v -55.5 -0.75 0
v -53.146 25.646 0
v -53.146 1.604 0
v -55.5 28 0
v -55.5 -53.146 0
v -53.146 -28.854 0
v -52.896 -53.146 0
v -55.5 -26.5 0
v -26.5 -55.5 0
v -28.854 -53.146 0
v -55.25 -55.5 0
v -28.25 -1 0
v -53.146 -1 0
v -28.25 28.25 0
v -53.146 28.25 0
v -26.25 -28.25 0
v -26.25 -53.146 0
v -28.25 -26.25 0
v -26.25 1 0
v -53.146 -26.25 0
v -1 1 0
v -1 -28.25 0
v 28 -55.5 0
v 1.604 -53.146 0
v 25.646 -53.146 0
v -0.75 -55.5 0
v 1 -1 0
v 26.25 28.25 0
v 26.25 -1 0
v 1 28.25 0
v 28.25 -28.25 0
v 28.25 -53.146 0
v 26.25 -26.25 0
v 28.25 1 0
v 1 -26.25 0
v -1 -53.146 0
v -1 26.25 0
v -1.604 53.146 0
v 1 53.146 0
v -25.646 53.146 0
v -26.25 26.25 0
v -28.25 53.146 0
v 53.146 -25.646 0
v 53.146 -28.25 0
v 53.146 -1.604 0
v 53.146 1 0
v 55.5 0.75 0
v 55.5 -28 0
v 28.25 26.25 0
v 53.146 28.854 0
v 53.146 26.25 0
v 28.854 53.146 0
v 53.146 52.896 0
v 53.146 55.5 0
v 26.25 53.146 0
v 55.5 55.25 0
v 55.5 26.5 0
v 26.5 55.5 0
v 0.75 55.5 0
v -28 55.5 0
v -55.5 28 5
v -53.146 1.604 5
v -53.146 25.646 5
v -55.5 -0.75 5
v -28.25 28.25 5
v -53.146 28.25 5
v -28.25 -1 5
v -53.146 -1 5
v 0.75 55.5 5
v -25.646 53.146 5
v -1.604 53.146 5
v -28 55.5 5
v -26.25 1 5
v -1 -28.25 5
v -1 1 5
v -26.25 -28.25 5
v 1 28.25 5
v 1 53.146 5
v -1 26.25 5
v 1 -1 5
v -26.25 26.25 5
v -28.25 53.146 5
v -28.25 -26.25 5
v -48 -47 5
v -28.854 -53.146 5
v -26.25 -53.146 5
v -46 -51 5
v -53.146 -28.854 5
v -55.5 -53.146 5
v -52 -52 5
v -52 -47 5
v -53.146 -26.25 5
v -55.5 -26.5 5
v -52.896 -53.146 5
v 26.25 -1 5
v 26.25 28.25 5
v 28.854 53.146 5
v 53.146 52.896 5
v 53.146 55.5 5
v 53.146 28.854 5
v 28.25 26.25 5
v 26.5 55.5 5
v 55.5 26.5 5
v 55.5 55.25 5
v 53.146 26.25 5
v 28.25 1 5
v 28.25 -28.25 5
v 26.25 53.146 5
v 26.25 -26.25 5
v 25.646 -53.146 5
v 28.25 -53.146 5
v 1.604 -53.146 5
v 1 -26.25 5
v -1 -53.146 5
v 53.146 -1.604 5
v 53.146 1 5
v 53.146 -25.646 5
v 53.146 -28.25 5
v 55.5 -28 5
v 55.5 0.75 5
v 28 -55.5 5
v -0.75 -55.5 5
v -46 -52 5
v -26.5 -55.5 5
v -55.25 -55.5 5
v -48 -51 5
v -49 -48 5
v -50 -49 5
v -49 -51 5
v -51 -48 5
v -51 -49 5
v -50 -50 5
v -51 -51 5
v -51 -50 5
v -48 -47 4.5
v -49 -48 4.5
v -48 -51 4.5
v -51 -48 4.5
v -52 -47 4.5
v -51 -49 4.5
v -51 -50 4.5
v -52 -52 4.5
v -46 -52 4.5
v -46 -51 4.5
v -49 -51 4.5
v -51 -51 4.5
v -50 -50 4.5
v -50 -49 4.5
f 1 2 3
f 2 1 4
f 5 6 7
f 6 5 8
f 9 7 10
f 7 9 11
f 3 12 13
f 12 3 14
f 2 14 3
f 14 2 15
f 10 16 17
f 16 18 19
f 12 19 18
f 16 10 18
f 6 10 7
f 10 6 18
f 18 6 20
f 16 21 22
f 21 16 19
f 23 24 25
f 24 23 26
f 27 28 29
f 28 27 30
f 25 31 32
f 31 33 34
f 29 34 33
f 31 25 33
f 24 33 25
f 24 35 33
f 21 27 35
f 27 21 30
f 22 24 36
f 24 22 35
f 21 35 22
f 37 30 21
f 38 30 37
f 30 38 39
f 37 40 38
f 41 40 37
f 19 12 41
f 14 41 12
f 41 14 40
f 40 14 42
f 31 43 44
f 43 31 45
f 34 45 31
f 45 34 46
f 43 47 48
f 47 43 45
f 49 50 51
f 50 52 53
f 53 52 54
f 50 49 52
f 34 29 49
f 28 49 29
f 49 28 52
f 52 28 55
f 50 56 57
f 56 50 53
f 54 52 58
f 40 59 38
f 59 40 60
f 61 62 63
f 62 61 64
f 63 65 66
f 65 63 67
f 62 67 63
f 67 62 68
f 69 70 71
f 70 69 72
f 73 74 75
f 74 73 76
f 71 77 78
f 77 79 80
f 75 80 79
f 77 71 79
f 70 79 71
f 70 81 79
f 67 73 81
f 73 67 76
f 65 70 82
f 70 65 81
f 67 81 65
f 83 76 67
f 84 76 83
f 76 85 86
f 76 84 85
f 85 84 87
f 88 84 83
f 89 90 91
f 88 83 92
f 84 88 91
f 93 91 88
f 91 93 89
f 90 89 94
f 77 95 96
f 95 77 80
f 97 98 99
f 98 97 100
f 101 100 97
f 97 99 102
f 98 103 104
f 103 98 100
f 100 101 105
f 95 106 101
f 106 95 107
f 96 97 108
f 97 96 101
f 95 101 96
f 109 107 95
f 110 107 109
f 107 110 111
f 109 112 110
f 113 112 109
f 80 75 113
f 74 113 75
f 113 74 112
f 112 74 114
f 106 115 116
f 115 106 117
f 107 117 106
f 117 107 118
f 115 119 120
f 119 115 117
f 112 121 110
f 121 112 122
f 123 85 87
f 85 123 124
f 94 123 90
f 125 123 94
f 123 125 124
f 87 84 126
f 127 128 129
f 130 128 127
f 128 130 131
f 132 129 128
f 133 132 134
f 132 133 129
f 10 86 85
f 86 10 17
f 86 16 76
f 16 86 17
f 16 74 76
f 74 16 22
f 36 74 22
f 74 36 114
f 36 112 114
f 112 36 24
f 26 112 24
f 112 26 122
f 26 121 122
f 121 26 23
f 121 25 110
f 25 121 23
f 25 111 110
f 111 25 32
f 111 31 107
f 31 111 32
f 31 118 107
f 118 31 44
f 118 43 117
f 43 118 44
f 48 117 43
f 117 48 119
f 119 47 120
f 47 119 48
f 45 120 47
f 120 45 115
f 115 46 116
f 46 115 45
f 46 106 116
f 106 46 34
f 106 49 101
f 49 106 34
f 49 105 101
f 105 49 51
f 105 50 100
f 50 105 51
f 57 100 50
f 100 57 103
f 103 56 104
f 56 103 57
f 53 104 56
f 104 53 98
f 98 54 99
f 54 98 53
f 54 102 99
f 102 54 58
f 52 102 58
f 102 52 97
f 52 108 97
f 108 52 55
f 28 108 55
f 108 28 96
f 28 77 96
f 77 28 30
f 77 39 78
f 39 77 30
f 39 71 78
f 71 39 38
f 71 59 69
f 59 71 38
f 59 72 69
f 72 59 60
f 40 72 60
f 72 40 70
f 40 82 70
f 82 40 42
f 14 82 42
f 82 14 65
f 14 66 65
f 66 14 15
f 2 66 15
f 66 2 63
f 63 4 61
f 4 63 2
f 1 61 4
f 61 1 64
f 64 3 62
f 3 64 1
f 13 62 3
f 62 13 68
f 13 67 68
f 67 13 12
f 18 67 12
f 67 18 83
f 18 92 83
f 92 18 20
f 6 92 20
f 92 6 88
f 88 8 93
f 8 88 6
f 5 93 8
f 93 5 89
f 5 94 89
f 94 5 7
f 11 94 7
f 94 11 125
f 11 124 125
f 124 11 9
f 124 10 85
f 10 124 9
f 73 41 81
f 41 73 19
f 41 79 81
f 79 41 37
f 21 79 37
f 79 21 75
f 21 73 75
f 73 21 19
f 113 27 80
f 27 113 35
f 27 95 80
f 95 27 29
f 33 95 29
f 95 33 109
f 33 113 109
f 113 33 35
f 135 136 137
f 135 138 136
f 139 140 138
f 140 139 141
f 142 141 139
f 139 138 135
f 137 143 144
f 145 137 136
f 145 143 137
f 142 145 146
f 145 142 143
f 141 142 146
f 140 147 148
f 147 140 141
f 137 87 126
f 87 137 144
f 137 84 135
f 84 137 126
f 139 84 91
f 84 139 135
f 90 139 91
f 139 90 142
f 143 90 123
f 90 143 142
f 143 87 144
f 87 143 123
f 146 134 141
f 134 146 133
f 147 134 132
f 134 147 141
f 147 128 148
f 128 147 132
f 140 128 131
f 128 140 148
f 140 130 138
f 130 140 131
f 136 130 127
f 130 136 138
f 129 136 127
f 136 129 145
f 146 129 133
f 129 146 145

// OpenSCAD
// [FL_INDEX: keywords="openscad, 3d_parametric, Extensible_Chessboard, csg_solid" | COT="Parametric OpenSCAD design from 3DCodeverse"]
// Title: Extensible Chessboard

// chess board

// size of 8x8 chess board
size=220;
// thickness of board
T=5;
// overlap between squares
overlap=2;
// tolerance for easy fit
tol=0.5;

L=(size-overlap)/8;

translate(2*L*[-1,-1,0])4x4();
*assembly();

module assembly(){
	4x4();
	rotate([0,0,180])4x4();
	translate([-4*L,0,0])4x4();
	translate([0,-4*L,0])4x4();
}

module 4x4()
difference(){
	linear_extrude(height=T)translate(-overlap/2*[1,1])difference(){
		for(i=[0:3],j=[0:3])if((i+j)%2==0)translate([i*L,j*L])square(L+overlap);
		notches2();
		translate((L*4+overlap)*[1,1])mirror([1,1])notches2();
	}
	translate([overlap+tol,overlap+tol,T])monogram();
}

module notches2(){
	notch();
	notches();
	mirror([1,-1])notches();
}

module notches(){
	translate([2*L,0])notch();
	translate([L+overlap,0])mirror([1,0])notch();
	translate([3*L+overlap,0])mirror([1,0])notch();
}

module notch()
translate([tol/2,0])difference(){
	square(2*overlap+tol*sqrt(2),center=true);
	rotate(-45)translate([0,-2*overlap])square(overlap*4);
}

module monogram(h=1)
linear_extrude(height=h,center=true)
union(){
	difference(){
		square([4,5]);
		translate([1,1])square([2,3]);
	}
	square([6,1]);
	translate([0,2])square([2,1]);
}
